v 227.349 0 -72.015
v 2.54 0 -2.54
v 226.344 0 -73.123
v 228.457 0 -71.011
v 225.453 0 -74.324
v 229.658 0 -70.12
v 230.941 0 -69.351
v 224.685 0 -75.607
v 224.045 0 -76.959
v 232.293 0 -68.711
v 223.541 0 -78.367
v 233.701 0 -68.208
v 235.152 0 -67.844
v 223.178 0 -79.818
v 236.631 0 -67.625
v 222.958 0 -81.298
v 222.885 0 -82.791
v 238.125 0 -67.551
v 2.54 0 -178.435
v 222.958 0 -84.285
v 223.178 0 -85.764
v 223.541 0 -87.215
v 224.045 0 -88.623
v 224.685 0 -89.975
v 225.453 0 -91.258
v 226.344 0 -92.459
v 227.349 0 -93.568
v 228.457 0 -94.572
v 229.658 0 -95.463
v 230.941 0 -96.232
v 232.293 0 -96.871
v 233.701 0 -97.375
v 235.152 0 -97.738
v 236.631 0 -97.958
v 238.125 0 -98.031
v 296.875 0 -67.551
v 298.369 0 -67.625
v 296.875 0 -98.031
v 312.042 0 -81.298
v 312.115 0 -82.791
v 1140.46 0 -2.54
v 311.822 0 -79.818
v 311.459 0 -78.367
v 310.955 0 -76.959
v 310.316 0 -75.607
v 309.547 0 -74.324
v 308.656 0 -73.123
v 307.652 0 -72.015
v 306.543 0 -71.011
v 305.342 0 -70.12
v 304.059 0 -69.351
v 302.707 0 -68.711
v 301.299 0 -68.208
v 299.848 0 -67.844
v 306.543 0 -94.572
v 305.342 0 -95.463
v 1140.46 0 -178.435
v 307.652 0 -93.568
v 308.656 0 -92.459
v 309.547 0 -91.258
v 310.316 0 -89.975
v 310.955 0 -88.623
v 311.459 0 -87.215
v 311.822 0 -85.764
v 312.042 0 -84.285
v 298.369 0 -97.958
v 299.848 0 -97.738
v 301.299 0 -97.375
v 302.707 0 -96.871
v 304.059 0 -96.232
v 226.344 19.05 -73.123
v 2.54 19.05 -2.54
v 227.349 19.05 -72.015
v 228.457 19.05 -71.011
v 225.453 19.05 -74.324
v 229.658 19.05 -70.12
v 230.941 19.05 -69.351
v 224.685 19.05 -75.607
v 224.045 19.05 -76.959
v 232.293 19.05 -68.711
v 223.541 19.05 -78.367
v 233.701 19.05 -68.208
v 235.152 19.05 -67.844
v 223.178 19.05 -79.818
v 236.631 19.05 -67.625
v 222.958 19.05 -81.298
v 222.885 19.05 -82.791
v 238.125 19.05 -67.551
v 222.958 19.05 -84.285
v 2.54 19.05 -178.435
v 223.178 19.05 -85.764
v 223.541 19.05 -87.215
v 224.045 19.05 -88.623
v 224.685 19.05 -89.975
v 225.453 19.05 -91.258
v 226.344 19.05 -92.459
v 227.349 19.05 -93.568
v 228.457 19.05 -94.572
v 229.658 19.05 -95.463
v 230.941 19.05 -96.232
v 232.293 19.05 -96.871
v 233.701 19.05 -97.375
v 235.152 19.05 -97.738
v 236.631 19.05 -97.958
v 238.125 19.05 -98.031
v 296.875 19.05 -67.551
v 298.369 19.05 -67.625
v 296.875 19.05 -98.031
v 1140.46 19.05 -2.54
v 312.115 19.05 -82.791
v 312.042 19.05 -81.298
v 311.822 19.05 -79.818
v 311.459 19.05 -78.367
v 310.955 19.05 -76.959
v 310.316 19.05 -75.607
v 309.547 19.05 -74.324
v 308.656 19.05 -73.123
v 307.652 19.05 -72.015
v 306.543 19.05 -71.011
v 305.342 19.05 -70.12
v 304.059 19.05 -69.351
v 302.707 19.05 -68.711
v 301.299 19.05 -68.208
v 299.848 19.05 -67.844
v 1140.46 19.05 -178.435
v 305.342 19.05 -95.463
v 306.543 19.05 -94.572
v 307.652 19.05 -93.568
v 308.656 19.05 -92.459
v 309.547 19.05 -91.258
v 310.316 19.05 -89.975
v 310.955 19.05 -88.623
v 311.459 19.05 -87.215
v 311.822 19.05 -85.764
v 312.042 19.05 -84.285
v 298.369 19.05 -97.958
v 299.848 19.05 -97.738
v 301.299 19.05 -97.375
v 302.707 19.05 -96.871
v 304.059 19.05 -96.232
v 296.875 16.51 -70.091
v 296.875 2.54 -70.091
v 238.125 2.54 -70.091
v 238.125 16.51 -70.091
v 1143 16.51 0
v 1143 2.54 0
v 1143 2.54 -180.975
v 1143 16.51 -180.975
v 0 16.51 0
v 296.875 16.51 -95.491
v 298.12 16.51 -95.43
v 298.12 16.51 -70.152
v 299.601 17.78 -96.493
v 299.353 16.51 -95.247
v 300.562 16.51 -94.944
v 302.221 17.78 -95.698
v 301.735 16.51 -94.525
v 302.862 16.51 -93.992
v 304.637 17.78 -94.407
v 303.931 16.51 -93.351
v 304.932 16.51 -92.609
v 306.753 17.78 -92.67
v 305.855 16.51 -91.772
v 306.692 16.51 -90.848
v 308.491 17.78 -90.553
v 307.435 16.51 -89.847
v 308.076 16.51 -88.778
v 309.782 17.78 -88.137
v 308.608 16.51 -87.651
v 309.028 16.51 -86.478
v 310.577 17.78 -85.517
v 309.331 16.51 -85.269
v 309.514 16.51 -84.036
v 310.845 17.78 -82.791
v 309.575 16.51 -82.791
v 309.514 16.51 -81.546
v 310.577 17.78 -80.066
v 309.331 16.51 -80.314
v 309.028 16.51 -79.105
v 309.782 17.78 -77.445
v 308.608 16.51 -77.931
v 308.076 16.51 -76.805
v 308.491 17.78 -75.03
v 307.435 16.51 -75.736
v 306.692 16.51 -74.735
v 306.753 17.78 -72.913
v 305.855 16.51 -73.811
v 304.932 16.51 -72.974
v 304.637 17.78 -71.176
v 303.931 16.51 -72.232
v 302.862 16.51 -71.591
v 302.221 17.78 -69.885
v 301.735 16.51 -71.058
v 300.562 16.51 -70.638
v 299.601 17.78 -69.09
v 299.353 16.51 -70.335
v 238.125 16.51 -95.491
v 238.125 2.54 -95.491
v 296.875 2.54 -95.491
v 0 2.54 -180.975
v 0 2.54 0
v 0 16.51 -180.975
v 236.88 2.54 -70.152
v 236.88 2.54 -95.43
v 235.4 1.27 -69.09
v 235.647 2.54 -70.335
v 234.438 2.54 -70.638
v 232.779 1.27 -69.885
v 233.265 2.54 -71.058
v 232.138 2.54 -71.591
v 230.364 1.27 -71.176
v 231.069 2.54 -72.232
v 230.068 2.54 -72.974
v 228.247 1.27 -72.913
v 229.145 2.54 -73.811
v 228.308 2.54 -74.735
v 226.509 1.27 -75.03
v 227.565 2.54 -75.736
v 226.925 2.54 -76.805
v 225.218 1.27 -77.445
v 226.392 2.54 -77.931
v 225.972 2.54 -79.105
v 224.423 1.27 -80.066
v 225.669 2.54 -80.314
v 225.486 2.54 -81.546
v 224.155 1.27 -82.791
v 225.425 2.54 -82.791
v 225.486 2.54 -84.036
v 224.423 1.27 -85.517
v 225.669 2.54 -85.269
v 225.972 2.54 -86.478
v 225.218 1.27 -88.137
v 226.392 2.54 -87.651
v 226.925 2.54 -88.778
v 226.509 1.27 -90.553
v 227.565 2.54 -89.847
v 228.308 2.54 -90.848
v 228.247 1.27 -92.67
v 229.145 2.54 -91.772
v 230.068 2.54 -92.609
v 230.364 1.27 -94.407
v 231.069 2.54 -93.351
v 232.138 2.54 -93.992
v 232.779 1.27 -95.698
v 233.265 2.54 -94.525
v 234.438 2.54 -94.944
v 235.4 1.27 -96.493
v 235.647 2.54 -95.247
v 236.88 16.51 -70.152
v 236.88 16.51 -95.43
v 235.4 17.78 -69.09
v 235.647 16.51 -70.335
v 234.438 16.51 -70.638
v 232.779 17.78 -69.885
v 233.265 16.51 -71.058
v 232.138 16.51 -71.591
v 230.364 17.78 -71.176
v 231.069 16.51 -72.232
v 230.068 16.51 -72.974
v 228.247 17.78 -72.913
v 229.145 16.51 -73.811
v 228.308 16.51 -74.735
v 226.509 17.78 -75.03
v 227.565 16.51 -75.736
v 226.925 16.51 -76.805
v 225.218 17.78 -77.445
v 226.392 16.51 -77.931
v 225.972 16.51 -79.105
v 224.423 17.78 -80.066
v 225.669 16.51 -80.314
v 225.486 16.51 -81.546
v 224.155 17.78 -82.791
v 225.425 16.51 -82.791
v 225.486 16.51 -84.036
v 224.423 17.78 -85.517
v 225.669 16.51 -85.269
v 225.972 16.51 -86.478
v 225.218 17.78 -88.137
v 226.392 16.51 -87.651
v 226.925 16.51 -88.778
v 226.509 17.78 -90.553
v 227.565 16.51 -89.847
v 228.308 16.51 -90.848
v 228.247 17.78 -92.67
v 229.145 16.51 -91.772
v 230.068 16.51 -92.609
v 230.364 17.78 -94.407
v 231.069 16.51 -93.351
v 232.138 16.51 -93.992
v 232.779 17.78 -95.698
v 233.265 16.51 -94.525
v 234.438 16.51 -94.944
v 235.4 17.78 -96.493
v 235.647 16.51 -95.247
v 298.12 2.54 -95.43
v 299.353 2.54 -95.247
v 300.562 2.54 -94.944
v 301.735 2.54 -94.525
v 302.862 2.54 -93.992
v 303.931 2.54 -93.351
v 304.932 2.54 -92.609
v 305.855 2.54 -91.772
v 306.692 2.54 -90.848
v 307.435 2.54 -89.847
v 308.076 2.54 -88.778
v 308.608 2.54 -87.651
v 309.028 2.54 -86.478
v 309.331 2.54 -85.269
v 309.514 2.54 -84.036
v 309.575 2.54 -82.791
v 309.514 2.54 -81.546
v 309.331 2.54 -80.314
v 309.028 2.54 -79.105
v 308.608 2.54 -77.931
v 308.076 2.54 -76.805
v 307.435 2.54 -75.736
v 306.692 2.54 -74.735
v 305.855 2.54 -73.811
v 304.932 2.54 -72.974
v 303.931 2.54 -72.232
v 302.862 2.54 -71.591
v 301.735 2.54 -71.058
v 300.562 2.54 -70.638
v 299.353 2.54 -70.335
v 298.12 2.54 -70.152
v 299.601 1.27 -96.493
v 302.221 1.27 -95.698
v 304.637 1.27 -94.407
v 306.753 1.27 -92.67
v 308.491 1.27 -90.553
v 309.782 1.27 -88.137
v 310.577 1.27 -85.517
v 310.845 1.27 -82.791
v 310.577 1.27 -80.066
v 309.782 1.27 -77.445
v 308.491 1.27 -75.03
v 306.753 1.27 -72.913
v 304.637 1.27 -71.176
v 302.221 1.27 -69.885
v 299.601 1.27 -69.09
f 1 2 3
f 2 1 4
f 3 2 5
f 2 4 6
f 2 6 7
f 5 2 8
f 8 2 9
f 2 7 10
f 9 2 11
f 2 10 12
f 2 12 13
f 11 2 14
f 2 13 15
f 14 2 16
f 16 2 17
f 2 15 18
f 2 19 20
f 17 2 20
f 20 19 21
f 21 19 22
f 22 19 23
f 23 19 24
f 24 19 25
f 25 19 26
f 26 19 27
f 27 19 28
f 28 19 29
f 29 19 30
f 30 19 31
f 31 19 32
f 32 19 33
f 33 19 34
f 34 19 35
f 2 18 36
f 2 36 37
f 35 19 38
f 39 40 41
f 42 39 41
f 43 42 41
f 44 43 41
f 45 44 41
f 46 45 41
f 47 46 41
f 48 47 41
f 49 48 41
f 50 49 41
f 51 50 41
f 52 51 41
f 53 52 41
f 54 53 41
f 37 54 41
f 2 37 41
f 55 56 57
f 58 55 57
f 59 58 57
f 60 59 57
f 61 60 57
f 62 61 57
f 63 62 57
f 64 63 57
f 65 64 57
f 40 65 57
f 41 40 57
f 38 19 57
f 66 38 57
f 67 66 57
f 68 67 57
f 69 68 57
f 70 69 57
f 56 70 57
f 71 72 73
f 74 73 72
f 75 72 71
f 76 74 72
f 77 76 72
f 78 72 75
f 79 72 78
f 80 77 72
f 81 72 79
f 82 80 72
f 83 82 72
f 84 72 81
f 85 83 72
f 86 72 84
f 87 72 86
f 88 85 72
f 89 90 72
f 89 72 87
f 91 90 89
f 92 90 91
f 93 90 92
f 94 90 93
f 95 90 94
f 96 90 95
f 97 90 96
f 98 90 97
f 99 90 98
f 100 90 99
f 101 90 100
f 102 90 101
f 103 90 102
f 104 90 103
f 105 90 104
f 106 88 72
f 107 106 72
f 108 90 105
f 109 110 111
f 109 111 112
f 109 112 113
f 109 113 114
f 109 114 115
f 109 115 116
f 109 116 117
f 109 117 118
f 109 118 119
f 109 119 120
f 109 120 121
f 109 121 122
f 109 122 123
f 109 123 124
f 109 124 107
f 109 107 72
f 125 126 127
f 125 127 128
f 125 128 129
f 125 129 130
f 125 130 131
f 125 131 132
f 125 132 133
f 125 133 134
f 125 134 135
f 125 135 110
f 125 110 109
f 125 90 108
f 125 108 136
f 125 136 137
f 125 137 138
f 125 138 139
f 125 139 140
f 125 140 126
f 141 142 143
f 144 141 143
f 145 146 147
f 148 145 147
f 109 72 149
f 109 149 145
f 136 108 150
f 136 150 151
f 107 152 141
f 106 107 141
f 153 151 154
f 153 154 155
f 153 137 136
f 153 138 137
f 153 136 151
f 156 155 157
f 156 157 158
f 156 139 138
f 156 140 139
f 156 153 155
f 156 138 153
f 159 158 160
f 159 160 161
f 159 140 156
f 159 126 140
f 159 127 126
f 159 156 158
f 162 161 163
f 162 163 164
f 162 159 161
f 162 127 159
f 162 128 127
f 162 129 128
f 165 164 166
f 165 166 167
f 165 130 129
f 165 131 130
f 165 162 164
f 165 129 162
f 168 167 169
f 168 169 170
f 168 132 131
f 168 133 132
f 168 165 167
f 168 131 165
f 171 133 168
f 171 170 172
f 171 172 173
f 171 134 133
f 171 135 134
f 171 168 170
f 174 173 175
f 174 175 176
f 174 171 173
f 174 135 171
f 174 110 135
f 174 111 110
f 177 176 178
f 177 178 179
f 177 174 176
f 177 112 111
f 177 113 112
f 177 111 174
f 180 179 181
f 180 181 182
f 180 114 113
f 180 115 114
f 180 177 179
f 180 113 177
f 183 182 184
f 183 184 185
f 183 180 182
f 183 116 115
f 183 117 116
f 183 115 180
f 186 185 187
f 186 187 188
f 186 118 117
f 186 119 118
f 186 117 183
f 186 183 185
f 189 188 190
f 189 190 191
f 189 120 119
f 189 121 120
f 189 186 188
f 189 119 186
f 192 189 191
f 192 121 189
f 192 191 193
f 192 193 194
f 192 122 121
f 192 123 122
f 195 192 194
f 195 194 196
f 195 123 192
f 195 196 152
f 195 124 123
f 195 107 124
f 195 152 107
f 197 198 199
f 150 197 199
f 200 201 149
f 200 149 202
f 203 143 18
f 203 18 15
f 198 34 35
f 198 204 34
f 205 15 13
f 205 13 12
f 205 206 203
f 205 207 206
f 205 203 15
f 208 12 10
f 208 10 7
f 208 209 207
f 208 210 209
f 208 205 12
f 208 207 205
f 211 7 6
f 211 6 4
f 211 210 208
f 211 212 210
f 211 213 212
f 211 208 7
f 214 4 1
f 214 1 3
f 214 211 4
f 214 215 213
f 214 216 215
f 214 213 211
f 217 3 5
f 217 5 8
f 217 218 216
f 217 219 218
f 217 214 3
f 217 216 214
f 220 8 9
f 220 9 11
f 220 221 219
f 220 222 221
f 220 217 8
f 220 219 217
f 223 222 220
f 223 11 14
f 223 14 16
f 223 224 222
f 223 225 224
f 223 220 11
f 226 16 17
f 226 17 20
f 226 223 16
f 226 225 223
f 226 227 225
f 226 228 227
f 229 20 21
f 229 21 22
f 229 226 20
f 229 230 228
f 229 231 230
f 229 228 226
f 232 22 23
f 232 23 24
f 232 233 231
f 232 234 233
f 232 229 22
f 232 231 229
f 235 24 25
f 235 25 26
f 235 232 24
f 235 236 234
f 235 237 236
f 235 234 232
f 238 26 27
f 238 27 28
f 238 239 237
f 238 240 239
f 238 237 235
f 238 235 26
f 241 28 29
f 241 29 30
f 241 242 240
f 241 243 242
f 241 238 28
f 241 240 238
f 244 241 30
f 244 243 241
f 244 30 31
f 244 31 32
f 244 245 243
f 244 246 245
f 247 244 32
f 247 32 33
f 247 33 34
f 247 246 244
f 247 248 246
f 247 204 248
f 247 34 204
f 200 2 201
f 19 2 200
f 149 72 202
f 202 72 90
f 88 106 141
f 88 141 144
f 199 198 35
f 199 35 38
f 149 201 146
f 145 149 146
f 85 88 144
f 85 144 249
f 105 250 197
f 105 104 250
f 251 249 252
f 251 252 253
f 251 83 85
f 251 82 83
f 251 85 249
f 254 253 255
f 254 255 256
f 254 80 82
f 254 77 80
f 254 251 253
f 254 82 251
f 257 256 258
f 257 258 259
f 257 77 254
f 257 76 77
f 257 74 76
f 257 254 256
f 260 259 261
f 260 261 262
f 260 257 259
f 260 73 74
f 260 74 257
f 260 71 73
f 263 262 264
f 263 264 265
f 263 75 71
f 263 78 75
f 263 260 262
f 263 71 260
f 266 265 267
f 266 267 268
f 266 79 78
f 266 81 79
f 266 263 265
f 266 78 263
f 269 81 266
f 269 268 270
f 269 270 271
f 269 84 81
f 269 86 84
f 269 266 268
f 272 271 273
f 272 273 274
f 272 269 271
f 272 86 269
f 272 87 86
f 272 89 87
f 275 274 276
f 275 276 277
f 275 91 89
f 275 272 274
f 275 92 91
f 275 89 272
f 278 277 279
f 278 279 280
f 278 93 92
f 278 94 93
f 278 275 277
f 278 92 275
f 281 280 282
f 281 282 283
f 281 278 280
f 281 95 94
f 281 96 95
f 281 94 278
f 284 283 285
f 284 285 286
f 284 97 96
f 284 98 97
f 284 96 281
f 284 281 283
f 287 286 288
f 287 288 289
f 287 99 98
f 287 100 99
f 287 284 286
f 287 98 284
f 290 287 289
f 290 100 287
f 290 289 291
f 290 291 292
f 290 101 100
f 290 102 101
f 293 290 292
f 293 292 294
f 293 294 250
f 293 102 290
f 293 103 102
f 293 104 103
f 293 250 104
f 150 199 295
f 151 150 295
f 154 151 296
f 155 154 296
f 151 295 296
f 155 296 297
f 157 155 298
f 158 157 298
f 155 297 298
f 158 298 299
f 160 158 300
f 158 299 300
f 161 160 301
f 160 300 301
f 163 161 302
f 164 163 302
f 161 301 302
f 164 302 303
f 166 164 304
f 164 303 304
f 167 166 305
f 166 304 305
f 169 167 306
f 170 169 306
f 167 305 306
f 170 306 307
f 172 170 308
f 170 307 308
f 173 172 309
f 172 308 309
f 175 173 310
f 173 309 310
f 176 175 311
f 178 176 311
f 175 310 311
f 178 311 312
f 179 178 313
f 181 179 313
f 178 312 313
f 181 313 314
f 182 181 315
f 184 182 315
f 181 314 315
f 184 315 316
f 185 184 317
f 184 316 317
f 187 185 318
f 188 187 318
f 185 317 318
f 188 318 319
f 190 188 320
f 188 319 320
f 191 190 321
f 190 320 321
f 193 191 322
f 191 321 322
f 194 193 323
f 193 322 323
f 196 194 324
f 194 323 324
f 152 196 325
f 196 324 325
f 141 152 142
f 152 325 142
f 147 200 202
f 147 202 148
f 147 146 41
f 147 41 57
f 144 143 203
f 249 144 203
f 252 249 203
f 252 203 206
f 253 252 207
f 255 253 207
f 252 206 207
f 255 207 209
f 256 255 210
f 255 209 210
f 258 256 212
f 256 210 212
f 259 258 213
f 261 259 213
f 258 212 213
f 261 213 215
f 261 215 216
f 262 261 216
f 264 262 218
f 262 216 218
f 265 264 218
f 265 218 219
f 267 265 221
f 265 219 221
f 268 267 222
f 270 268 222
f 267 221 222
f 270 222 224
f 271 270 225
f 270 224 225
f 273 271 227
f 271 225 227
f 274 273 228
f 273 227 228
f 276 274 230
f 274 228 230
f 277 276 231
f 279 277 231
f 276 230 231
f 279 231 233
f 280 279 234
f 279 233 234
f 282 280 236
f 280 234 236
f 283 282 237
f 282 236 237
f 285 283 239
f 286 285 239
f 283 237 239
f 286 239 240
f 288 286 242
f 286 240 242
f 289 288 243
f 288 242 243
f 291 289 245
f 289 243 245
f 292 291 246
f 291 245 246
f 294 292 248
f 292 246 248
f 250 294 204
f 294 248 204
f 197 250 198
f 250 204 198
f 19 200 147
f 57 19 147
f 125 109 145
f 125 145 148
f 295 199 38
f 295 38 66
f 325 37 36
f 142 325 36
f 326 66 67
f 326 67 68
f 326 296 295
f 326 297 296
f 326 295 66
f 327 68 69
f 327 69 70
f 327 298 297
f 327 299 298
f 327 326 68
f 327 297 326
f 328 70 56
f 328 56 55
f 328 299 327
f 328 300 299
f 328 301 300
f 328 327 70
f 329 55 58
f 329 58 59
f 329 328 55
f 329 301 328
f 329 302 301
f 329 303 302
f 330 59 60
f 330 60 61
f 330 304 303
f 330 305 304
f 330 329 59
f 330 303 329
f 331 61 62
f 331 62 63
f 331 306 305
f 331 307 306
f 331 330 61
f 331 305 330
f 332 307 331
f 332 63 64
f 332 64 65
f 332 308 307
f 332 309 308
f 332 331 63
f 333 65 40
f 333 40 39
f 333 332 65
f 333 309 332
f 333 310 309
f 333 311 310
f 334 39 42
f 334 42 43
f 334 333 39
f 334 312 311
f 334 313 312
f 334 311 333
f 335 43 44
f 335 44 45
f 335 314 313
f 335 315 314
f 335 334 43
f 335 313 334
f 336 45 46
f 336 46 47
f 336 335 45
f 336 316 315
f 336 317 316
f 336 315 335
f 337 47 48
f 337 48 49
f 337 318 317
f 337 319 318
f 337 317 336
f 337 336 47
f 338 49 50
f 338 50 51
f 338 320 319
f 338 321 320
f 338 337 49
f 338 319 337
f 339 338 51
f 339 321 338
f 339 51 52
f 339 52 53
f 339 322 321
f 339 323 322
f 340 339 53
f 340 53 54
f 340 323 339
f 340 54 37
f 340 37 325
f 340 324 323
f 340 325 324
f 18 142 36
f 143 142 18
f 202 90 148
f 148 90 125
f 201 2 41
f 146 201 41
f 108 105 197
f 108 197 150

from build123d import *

# Parameters (mm, degrees)
SKETCH1_W           = 1143
SKETCH1_H           = 180.975
BOSS_EXTRUDE1_DEPTH = 19.05
CHAMFER1_SIZE       = 2.54
CHAMFER2_SIZE       = 2.54


with BuildPart() as part:
    # Sketch1 → Boss-Extrude1 (new body)
    with BuildSketch(Plane(origin=(0, 0, 0), x_dir=(1, 0, 0), z_dir=(0, 1, 0))):
        with Locations((571.5, 90.4875)):
            Rectangle(SKETCH1_W, SKETCH1_H)
        with BuildLine():
            Line((238.125, 95.4913), (296.8752, 95.4913))
            ThreePointArc((296.8752, 95.4913), (309.5752, 82.7913), (296.8752, 70.0913))
            Line((296.8752, 70.0913), (238.125, 70.0913))
            ThreePointArc((238.125, 70.0913), (225.425, 82.7913), (238.125, 95.4913))
        make_face(mode=Mode.SUBTRACT)
    extrude(amount=BOSS_EXTRUDE1_DEPTH)

    # Chamfer1
    chamfer1_edges = [part.edges().sort_by_distance(p)[0] for p in [
        (1143, 19.05, -90.4875),
        (309.5752, 19.05, -82.7913),
        (571.5, 19.05, -180.975),
        (267.5001, 19.05, -95.4913),
        (225.425, 19.05, -82.7913),
        (267.5001, 19.05, -70.0913),
        (0, 19.05, -90.4875),
        (571.5, 19.05, 0),
    ]]
    chamfer(chamfer1_edges, length=CHAMFER1_SIZE)

    # Chamfer2
    chamfer2_edges = [part.edges().sort_by_distance(p)[0] for p in [
        (309.5752, 0, -82.7913),
        (267.5001, 0, -95.4913),
        (225.425, 0, -82.7913),
        (267.5001, 0, -70.0913),
        (571.5, 0, -180.975),
        (1143, 0, -90.4875),
        (571.5, 0, 0),
        (0, 0, -90.4875),
    ]]
    chamfer(chamfer2_edges, length=CHAMFER2_SIZE)


solid = part.part
